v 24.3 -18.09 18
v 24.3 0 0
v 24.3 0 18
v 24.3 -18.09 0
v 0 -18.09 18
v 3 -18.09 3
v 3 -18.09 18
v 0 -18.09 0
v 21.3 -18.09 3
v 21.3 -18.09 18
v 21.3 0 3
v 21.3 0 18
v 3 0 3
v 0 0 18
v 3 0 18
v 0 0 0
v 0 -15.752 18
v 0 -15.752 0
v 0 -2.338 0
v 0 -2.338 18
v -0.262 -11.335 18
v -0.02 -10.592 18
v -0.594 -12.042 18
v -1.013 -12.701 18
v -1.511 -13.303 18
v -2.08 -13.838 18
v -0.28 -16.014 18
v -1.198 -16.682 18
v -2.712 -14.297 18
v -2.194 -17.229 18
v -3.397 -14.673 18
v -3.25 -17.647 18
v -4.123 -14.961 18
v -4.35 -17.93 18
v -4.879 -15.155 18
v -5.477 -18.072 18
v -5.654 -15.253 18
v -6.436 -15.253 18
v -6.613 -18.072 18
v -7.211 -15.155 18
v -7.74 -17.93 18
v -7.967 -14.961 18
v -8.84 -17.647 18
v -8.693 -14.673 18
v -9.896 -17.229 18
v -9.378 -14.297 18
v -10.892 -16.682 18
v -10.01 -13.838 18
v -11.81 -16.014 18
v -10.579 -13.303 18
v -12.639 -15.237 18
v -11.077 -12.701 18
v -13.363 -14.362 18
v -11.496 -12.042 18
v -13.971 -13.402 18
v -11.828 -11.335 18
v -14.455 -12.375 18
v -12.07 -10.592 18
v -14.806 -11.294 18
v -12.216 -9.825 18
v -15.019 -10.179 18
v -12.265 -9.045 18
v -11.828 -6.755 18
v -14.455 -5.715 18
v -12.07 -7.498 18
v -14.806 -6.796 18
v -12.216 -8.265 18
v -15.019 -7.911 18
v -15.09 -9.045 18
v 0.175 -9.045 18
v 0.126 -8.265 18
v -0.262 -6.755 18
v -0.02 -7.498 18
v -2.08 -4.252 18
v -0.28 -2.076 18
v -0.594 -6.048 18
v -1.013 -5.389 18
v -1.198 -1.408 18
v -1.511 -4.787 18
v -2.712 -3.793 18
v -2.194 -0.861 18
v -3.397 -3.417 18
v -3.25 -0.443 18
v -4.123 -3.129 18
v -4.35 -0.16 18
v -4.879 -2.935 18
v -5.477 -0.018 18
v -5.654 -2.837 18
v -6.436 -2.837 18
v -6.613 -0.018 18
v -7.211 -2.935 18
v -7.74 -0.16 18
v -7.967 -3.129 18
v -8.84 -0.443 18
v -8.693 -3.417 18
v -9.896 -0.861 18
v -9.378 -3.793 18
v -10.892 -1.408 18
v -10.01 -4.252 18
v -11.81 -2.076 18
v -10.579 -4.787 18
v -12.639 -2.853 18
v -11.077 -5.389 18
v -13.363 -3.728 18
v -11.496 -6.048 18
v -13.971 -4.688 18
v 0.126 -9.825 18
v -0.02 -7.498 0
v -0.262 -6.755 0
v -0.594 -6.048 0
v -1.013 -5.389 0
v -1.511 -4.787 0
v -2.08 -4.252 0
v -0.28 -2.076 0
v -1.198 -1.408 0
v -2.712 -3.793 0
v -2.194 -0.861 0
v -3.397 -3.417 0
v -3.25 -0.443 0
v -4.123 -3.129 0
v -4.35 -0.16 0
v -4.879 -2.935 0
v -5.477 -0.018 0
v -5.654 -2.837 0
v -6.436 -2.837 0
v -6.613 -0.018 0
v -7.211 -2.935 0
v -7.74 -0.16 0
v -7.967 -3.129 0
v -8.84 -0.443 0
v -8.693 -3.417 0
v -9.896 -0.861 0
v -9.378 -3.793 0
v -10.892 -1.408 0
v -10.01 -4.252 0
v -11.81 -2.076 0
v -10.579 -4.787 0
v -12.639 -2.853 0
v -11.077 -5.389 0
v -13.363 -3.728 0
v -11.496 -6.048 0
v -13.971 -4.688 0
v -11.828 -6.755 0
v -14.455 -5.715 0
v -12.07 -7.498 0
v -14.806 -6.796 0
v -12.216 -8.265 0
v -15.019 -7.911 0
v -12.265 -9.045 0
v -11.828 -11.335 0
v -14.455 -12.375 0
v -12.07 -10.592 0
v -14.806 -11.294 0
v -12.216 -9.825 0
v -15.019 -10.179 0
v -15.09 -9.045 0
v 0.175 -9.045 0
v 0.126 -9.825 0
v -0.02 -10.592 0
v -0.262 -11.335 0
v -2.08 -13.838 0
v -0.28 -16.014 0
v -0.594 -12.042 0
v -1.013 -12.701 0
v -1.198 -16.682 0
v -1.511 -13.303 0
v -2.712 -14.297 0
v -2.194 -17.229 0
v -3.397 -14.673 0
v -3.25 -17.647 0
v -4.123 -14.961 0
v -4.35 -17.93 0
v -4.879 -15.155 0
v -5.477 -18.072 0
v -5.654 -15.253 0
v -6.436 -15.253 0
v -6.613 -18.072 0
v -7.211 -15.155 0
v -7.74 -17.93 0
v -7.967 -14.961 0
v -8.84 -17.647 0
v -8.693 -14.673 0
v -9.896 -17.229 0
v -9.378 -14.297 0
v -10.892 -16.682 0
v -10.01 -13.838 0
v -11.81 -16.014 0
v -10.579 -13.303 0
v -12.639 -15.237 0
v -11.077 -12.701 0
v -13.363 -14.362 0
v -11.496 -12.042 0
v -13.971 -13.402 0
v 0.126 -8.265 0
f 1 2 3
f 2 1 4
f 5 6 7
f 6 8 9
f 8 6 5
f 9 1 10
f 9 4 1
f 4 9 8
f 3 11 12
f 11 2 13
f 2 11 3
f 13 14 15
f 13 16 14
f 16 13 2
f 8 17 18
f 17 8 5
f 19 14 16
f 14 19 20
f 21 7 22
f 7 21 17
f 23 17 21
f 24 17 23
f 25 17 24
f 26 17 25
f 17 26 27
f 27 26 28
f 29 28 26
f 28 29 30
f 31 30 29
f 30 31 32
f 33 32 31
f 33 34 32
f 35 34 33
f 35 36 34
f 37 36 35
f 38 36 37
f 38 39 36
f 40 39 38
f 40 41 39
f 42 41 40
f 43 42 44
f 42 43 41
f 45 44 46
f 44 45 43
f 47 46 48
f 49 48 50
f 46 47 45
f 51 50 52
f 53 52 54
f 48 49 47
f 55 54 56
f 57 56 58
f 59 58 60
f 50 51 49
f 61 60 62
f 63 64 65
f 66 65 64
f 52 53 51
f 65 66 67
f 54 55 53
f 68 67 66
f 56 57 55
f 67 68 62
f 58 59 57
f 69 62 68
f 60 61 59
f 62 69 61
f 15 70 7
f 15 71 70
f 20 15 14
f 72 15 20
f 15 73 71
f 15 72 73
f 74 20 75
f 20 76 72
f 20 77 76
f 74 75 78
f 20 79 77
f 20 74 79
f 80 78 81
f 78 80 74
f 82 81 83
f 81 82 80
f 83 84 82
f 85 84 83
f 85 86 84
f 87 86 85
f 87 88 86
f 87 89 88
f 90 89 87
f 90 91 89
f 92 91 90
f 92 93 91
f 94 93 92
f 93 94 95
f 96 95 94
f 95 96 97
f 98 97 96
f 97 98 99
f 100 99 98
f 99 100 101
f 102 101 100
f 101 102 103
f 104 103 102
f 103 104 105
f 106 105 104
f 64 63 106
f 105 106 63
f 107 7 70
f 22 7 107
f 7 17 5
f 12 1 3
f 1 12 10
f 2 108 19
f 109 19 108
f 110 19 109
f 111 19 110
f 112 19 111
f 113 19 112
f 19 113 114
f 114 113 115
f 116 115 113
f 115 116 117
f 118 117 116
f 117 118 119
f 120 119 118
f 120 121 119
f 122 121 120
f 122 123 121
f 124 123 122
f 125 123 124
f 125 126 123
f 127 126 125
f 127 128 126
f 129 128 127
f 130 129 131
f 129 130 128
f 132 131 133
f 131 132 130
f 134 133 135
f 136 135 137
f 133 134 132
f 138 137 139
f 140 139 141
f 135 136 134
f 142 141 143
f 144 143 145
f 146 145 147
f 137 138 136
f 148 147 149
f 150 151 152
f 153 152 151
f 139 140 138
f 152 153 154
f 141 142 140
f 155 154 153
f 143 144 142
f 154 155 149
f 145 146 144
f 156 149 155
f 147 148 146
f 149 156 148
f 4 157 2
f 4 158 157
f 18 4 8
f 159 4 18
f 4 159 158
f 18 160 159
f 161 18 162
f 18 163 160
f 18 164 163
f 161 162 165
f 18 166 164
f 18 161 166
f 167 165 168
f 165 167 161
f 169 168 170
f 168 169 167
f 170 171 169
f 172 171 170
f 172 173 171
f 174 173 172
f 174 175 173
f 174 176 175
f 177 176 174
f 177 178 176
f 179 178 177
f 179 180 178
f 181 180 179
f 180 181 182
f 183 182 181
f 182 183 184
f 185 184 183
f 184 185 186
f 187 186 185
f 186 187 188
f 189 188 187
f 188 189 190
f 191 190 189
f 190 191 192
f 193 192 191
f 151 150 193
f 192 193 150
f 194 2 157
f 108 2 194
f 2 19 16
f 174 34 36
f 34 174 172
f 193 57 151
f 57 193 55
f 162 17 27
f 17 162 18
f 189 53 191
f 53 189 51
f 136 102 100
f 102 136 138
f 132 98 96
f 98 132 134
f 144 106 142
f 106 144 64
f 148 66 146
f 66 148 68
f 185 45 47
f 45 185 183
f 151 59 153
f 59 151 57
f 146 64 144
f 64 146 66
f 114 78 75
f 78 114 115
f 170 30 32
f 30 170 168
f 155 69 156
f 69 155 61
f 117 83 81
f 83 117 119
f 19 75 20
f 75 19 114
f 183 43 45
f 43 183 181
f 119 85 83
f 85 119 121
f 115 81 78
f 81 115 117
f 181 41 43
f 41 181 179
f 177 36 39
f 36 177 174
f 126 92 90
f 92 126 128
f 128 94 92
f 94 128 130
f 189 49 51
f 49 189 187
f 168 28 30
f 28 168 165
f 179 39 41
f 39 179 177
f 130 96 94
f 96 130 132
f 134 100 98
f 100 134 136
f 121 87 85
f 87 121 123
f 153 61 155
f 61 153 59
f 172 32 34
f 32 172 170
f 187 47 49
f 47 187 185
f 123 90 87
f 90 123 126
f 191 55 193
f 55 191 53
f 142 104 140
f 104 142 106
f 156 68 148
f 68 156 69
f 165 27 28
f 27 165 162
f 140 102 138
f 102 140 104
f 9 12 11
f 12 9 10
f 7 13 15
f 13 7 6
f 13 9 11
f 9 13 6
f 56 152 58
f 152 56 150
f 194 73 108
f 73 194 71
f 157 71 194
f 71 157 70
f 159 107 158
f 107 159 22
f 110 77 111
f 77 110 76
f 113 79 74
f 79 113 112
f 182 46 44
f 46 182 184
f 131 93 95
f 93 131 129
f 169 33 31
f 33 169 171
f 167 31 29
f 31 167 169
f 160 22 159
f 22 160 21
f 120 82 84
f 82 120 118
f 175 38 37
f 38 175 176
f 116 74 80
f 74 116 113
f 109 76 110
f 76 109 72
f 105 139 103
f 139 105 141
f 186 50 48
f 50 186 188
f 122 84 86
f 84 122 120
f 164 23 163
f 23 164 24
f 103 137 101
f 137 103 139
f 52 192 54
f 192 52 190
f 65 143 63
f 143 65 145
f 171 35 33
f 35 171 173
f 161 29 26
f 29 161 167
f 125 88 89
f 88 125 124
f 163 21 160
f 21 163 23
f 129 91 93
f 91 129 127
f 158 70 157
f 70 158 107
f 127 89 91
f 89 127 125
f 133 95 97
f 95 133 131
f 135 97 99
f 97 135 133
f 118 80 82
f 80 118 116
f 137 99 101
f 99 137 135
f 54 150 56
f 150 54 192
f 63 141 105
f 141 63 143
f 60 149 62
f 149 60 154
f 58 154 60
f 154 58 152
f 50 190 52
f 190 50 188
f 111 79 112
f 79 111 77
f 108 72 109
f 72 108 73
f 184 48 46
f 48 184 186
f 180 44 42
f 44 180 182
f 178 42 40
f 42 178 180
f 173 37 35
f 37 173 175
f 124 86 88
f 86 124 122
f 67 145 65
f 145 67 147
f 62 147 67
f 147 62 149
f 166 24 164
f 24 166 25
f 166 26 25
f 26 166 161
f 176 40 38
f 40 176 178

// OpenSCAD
$fn = 50;

nozzleRadius = 0.35 / 2;
play = nozzleRadius;

plateThickness = 18.3;
mountLength = 15;
wallThickness = 3;
laserRadius = 12.09 / 2;

height = 2 * wallThickness + 2 * laserRadius;
width = 2 * wallThickness + plateThickness;
length = wallThickness + mountLength;

laserMount();

module laserMount()
{
    rotate([90, 0, 0])  //  Rotate the design to the most favourable orientation for FDM
    {
        difference()
        {
            union()
            {
                cube([width, length, height]);  //  Start with the base for the mount
                translate([-laserRadius, 0, wallThickness + laserRadius])
                {
                    rotate([-90, 0, 0])
                    {
                        cylinder(r = laserRadius + wallThickness, h = length);  //  Base for the laser mount
                    }
                }
            }
            translate([wallThickness, wallThickness, -0.1])
            {
                cube([plateThickness, mountLength + 0.1, height + 0.2]); // Cut out the shape of the plate the design is attached to
            }
            translate([-laserRadius, 0, wallThickness + laserRadius])
            {
                rotate([-90, 0, 0])
                {
                    translate([0, 0, -0.1])
                    {
                        cylinder(r = laserRadius + play, h = length + 0.2);   //  Cut out the shape of the laser with a little play to provide a nice fit
                    }
                }
            }
        }
    }
}
